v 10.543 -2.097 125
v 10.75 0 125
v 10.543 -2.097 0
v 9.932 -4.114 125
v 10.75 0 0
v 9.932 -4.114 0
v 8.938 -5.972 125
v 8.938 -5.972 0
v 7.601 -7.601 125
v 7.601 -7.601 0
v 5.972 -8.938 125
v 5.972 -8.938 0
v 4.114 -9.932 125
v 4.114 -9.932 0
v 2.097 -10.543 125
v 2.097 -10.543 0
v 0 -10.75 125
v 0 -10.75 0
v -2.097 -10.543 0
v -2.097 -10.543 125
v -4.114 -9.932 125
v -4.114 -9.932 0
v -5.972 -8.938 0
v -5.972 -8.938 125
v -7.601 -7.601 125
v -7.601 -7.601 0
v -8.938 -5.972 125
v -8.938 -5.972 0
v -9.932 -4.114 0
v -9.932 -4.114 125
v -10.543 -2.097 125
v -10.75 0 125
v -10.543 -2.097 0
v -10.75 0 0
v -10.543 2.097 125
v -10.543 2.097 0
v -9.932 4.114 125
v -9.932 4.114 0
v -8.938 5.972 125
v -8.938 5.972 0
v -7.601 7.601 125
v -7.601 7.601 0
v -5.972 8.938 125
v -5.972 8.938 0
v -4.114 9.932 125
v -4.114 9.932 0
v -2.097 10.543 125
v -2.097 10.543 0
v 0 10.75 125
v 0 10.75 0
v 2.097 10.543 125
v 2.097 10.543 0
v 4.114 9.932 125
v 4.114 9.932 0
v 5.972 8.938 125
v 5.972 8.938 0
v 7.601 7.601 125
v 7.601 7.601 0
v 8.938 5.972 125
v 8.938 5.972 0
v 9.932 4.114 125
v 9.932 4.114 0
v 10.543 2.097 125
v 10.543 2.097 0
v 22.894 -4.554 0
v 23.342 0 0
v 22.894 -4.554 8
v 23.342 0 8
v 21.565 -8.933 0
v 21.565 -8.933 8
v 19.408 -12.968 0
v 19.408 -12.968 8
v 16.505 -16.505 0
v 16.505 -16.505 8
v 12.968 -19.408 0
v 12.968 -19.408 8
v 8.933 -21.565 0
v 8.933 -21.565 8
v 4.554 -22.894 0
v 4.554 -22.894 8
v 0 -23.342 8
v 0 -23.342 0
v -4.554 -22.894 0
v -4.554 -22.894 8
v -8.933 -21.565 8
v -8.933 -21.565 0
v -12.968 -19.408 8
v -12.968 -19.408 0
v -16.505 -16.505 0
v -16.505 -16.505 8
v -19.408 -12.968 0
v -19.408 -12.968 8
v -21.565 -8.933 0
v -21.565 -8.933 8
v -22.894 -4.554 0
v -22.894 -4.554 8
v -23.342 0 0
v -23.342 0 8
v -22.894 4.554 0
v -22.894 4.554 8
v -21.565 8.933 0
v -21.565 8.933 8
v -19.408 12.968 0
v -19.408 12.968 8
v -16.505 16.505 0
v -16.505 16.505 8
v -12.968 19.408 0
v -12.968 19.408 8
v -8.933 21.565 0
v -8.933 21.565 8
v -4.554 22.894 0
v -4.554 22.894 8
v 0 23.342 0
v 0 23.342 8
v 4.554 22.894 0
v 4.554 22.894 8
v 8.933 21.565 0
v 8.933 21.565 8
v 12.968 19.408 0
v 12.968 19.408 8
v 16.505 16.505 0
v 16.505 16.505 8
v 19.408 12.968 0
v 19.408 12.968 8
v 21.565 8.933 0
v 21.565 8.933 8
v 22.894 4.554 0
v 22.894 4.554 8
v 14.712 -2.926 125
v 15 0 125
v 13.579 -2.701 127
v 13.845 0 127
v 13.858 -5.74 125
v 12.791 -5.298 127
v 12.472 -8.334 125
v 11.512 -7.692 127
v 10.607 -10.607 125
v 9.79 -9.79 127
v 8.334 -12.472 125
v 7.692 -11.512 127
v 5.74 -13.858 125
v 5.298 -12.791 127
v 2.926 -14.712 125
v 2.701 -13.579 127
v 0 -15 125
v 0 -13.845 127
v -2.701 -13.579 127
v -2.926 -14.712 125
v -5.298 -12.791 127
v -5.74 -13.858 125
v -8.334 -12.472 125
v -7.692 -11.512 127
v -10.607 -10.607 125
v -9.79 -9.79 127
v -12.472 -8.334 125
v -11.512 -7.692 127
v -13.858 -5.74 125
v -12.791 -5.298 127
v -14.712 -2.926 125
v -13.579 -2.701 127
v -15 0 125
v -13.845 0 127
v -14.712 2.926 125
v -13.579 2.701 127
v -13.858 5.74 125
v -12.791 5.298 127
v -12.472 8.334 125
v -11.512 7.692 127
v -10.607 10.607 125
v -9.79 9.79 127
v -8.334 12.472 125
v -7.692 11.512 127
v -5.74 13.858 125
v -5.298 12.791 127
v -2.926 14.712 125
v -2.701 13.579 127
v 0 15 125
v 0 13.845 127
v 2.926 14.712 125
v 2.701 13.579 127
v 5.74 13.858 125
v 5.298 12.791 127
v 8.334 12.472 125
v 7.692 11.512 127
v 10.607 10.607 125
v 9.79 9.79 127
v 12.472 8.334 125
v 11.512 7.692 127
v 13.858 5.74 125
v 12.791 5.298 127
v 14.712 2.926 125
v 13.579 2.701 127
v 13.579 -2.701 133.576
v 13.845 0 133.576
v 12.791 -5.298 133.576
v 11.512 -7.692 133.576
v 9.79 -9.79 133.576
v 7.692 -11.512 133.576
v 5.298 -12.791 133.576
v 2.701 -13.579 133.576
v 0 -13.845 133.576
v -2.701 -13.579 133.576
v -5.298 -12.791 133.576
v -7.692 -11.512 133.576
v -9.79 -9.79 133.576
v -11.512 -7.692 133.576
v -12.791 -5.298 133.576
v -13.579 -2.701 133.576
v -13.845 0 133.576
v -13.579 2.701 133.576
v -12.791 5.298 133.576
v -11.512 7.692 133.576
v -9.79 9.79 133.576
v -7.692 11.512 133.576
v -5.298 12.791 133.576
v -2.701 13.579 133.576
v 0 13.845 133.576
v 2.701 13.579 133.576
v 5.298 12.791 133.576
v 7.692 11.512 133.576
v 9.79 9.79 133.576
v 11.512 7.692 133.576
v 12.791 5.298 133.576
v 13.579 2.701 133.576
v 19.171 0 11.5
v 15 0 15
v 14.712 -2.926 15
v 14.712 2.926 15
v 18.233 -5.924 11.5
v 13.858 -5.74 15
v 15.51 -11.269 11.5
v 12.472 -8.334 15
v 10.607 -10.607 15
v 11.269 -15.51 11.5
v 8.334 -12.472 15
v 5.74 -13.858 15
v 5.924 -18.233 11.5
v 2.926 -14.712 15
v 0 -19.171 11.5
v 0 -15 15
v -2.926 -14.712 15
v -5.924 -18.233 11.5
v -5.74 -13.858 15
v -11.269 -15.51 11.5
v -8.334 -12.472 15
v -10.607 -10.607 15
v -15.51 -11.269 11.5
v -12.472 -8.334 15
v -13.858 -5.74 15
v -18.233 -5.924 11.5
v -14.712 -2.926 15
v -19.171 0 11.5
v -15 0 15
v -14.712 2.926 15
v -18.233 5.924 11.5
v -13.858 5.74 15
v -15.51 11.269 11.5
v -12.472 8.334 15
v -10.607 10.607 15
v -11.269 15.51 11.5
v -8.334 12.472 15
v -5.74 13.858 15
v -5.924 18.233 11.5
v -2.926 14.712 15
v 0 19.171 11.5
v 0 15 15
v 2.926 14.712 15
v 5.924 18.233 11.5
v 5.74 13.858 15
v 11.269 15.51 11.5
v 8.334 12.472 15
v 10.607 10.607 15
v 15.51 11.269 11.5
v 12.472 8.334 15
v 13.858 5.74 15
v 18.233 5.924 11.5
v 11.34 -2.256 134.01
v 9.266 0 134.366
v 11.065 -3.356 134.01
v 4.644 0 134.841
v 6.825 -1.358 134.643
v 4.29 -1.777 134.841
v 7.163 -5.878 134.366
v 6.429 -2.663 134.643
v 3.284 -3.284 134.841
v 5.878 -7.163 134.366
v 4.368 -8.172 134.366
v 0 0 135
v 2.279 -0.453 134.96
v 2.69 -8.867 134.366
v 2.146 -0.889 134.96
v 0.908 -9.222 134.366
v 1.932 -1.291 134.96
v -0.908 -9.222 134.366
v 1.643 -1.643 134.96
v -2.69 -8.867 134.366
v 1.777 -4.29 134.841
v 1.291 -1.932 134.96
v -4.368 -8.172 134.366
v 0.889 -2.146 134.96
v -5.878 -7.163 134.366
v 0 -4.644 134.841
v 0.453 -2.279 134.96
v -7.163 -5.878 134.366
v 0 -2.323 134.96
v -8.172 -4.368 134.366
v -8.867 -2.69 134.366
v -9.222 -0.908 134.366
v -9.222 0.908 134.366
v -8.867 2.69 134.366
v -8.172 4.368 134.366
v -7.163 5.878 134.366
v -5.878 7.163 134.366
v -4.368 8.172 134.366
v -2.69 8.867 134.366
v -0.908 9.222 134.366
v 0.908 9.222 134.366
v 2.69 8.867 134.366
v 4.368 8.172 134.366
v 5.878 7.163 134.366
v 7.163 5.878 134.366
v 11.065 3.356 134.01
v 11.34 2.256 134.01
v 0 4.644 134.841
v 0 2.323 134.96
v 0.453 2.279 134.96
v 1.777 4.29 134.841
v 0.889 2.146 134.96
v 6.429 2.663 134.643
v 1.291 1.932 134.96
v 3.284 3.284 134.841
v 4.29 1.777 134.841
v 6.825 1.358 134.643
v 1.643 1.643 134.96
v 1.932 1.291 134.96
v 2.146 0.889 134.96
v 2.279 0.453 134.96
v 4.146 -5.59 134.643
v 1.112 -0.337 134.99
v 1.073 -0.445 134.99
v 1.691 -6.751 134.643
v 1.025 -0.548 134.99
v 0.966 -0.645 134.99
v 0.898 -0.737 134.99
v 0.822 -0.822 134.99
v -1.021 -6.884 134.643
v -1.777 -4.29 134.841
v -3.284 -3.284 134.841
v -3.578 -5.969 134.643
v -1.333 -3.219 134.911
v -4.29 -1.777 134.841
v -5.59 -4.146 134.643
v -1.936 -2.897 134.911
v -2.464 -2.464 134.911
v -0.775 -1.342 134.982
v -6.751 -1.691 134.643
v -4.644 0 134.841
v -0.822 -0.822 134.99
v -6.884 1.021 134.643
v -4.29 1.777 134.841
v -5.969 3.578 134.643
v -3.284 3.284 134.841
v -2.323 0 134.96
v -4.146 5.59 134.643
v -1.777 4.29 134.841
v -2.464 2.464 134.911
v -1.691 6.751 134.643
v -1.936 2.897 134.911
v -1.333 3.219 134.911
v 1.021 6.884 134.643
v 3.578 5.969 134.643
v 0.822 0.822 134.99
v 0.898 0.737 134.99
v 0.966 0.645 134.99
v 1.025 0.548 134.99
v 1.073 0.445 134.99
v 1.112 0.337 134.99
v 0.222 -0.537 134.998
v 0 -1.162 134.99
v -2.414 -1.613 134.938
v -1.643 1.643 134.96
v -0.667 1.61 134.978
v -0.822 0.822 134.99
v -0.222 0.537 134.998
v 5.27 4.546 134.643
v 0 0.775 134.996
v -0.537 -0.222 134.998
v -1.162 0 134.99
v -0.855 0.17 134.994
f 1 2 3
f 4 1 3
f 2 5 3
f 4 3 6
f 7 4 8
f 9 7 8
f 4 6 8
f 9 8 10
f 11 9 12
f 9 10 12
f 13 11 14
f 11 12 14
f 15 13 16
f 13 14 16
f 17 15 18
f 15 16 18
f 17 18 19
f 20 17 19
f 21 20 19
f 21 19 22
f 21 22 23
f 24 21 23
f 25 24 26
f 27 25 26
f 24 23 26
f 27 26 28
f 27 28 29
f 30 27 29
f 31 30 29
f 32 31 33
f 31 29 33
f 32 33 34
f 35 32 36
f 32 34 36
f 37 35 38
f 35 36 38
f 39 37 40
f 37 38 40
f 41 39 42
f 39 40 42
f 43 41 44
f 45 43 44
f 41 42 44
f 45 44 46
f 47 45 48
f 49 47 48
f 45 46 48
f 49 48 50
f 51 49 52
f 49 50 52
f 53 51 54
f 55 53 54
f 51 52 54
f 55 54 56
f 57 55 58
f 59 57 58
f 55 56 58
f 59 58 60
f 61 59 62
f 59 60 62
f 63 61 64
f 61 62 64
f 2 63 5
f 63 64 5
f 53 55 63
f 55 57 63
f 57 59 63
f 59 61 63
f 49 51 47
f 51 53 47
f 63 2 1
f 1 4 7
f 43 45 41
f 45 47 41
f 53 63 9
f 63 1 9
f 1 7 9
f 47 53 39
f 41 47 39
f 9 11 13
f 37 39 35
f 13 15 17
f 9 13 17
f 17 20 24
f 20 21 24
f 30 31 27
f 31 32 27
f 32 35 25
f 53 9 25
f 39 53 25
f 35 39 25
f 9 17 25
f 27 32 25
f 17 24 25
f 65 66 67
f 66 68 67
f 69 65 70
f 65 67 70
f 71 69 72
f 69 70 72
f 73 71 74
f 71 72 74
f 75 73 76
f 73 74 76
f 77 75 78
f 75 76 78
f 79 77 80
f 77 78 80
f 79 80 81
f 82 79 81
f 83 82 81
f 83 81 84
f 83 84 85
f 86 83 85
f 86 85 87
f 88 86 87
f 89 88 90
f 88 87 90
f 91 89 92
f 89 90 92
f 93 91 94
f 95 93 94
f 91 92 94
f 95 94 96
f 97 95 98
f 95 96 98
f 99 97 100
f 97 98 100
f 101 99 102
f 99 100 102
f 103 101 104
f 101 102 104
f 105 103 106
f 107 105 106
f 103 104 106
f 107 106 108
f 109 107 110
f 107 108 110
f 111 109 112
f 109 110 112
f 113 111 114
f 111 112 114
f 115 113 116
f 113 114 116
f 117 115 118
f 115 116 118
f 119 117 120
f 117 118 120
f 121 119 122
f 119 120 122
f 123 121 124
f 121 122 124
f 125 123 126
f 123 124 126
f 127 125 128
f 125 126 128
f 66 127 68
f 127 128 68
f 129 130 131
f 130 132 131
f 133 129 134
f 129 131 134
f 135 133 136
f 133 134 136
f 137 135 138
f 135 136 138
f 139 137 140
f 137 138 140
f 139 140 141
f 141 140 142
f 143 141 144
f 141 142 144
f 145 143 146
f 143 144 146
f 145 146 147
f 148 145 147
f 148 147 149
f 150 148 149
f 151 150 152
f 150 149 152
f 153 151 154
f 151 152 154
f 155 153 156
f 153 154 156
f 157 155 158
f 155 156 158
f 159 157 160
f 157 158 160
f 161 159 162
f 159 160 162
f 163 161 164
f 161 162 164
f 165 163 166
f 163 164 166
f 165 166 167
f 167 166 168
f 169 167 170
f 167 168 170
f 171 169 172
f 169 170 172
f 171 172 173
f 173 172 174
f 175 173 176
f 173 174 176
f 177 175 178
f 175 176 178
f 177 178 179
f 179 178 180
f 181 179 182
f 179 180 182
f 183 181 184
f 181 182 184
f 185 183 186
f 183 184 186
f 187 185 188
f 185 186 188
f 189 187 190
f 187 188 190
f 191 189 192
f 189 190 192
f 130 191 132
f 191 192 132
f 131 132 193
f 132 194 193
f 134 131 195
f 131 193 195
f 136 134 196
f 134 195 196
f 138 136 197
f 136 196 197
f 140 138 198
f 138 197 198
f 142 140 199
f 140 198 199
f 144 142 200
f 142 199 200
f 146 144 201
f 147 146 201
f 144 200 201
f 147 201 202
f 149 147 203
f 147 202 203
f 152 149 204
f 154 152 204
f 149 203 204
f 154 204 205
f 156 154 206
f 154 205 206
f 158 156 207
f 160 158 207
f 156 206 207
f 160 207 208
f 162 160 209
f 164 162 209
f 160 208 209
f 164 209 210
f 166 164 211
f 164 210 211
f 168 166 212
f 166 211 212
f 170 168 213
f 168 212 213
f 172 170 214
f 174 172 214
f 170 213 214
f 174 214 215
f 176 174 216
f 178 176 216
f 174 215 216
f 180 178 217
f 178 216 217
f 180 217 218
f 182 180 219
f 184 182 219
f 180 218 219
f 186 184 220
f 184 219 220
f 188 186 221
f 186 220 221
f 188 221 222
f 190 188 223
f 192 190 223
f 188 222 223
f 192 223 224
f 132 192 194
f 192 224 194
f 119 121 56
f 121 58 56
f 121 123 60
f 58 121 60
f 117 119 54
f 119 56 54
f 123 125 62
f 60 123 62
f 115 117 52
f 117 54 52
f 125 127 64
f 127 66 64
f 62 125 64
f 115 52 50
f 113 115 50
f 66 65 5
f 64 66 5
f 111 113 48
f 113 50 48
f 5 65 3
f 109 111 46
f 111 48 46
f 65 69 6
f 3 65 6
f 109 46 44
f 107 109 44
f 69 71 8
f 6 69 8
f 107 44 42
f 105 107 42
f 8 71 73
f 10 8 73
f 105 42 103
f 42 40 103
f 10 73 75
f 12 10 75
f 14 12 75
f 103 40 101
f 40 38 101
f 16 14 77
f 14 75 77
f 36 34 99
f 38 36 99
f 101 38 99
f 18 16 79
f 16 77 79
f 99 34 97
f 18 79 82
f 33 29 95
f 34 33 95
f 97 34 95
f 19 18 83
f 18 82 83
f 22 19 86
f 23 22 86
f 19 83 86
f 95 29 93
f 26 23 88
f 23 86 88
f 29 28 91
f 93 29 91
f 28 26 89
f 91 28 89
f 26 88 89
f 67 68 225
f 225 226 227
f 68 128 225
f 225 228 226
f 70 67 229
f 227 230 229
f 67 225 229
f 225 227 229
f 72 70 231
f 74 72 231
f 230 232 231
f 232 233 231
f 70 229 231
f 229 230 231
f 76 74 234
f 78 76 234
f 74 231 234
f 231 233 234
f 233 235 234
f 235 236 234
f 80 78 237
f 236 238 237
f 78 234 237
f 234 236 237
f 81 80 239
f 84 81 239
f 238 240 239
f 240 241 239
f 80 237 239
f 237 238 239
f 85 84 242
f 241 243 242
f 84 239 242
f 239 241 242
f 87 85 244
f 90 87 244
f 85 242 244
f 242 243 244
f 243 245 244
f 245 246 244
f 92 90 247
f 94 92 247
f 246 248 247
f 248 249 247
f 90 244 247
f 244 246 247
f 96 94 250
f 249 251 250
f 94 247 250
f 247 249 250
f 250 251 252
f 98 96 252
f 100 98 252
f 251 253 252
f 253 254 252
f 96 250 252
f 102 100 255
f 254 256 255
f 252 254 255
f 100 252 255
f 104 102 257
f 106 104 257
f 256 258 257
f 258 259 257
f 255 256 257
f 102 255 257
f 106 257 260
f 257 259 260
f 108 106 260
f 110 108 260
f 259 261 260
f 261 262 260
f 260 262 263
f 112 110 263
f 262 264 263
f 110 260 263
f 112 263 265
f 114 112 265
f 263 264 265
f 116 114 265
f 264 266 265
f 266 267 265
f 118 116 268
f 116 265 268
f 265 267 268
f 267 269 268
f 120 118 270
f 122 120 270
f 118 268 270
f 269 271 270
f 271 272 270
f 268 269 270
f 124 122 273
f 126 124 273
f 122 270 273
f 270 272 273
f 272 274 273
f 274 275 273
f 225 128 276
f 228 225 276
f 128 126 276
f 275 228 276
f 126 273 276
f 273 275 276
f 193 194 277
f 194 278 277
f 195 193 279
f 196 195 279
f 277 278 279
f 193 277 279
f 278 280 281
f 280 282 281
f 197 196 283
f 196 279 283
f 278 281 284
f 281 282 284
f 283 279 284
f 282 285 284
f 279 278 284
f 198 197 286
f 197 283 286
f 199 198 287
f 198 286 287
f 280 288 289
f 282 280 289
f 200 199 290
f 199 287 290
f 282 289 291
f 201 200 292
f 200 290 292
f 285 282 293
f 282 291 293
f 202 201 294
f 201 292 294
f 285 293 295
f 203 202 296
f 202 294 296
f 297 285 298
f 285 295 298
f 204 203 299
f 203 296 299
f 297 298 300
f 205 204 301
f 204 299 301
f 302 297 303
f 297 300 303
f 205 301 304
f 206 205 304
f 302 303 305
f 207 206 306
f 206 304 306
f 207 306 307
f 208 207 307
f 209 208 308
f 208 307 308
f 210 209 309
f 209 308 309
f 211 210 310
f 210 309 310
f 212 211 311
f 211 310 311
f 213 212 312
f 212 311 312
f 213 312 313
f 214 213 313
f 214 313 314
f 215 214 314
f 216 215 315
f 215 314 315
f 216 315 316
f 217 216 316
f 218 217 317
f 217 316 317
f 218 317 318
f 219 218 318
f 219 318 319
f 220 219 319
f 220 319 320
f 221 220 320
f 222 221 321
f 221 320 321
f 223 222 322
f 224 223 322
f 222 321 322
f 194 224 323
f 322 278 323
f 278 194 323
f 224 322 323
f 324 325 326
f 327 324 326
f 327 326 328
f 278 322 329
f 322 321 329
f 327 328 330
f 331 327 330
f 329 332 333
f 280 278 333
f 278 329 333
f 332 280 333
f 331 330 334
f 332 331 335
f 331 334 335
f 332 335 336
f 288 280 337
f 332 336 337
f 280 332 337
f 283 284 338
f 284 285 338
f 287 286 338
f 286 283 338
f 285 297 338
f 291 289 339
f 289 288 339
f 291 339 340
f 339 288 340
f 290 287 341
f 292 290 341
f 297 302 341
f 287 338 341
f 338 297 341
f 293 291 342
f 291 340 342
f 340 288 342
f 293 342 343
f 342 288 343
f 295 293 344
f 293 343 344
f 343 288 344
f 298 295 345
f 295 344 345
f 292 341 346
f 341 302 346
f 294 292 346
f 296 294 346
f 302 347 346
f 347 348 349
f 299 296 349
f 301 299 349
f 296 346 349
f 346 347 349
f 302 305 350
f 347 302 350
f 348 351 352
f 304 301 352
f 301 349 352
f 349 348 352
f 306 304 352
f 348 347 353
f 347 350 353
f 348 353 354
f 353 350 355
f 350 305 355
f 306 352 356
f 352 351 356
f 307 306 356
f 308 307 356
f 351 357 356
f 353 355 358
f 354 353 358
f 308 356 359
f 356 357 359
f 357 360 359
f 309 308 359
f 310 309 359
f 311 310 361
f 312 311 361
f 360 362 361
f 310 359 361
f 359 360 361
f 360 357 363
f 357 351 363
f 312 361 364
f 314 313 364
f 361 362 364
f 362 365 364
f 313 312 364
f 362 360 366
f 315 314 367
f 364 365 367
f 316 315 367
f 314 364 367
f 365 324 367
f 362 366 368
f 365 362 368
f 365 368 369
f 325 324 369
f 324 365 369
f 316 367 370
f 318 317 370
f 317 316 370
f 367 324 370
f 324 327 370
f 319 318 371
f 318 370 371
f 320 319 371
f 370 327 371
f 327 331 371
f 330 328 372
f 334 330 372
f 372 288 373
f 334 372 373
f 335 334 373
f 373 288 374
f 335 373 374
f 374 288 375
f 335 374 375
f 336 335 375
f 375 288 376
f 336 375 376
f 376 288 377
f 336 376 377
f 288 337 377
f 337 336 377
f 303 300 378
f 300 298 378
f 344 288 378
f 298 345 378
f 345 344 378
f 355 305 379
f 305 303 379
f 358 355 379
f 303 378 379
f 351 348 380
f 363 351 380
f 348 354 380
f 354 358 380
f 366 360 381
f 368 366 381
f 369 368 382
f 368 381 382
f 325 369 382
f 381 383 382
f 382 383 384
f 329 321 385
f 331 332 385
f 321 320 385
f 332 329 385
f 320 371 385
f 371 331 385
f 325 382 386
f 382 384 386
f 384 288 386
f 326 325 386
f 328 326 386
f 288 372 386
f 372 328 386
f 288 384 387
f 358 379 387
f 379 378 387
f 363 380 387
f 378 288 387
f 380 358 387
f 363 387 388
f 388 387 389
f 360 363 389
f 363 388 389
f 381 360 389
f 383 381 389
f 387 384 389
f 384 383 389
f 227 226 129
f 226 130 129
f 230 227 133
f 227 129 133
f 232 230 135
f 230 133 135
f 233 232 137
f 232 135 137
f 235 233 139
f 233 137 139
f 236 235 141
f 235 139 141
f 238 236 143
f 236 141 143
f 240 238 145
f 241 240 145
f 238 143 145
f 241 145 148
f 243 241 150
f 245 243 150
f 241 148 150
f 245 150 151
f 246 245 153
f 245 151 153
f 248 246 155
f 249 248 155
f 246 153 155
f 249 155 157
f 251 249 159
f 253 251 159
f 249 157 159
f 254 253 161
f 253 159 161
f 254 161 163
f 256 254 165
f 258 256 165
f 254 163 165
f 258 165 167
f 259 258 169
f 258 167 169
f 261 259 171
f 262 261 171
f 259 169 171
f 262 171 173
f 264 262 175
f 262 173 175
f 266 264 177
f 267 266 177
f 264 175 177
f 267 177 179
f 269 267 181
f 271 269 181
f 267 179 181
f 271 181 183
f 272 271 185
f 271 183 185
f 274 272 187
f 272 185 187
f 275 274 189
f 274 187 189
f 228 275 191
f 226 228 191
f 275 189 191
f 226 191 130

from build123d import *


with BuildPart() as f1:
    # F0 (on Front) → F1 (revolve)
    with BuildSketch(Plane.XZ):
        with BuildLine():
            ThreePointArc((13.845299, 133.575579), (6.95919, 134.642957), (0, 135))
            Line((0, 135), (0, 125))
            Line((0, 125), (10.75, 125))
            Line((10.75, 125), (10.75, 0))
            Line((10.75, 0), (23.342275, 0))
            Line((23.342275, 0), (23.342275, 8))
            Line((23.342275, 8), (15, 15))
            Line((15, 15), (15, 125))
            Line((15, 125), (13.845299, 127))
            Line((13.845299, 127), (13.845299, 133.575579))
        make_face()
    revolve(axis=Axis((0, 0, 8.877954), (0, 0, -1)))


solid = f1.part
